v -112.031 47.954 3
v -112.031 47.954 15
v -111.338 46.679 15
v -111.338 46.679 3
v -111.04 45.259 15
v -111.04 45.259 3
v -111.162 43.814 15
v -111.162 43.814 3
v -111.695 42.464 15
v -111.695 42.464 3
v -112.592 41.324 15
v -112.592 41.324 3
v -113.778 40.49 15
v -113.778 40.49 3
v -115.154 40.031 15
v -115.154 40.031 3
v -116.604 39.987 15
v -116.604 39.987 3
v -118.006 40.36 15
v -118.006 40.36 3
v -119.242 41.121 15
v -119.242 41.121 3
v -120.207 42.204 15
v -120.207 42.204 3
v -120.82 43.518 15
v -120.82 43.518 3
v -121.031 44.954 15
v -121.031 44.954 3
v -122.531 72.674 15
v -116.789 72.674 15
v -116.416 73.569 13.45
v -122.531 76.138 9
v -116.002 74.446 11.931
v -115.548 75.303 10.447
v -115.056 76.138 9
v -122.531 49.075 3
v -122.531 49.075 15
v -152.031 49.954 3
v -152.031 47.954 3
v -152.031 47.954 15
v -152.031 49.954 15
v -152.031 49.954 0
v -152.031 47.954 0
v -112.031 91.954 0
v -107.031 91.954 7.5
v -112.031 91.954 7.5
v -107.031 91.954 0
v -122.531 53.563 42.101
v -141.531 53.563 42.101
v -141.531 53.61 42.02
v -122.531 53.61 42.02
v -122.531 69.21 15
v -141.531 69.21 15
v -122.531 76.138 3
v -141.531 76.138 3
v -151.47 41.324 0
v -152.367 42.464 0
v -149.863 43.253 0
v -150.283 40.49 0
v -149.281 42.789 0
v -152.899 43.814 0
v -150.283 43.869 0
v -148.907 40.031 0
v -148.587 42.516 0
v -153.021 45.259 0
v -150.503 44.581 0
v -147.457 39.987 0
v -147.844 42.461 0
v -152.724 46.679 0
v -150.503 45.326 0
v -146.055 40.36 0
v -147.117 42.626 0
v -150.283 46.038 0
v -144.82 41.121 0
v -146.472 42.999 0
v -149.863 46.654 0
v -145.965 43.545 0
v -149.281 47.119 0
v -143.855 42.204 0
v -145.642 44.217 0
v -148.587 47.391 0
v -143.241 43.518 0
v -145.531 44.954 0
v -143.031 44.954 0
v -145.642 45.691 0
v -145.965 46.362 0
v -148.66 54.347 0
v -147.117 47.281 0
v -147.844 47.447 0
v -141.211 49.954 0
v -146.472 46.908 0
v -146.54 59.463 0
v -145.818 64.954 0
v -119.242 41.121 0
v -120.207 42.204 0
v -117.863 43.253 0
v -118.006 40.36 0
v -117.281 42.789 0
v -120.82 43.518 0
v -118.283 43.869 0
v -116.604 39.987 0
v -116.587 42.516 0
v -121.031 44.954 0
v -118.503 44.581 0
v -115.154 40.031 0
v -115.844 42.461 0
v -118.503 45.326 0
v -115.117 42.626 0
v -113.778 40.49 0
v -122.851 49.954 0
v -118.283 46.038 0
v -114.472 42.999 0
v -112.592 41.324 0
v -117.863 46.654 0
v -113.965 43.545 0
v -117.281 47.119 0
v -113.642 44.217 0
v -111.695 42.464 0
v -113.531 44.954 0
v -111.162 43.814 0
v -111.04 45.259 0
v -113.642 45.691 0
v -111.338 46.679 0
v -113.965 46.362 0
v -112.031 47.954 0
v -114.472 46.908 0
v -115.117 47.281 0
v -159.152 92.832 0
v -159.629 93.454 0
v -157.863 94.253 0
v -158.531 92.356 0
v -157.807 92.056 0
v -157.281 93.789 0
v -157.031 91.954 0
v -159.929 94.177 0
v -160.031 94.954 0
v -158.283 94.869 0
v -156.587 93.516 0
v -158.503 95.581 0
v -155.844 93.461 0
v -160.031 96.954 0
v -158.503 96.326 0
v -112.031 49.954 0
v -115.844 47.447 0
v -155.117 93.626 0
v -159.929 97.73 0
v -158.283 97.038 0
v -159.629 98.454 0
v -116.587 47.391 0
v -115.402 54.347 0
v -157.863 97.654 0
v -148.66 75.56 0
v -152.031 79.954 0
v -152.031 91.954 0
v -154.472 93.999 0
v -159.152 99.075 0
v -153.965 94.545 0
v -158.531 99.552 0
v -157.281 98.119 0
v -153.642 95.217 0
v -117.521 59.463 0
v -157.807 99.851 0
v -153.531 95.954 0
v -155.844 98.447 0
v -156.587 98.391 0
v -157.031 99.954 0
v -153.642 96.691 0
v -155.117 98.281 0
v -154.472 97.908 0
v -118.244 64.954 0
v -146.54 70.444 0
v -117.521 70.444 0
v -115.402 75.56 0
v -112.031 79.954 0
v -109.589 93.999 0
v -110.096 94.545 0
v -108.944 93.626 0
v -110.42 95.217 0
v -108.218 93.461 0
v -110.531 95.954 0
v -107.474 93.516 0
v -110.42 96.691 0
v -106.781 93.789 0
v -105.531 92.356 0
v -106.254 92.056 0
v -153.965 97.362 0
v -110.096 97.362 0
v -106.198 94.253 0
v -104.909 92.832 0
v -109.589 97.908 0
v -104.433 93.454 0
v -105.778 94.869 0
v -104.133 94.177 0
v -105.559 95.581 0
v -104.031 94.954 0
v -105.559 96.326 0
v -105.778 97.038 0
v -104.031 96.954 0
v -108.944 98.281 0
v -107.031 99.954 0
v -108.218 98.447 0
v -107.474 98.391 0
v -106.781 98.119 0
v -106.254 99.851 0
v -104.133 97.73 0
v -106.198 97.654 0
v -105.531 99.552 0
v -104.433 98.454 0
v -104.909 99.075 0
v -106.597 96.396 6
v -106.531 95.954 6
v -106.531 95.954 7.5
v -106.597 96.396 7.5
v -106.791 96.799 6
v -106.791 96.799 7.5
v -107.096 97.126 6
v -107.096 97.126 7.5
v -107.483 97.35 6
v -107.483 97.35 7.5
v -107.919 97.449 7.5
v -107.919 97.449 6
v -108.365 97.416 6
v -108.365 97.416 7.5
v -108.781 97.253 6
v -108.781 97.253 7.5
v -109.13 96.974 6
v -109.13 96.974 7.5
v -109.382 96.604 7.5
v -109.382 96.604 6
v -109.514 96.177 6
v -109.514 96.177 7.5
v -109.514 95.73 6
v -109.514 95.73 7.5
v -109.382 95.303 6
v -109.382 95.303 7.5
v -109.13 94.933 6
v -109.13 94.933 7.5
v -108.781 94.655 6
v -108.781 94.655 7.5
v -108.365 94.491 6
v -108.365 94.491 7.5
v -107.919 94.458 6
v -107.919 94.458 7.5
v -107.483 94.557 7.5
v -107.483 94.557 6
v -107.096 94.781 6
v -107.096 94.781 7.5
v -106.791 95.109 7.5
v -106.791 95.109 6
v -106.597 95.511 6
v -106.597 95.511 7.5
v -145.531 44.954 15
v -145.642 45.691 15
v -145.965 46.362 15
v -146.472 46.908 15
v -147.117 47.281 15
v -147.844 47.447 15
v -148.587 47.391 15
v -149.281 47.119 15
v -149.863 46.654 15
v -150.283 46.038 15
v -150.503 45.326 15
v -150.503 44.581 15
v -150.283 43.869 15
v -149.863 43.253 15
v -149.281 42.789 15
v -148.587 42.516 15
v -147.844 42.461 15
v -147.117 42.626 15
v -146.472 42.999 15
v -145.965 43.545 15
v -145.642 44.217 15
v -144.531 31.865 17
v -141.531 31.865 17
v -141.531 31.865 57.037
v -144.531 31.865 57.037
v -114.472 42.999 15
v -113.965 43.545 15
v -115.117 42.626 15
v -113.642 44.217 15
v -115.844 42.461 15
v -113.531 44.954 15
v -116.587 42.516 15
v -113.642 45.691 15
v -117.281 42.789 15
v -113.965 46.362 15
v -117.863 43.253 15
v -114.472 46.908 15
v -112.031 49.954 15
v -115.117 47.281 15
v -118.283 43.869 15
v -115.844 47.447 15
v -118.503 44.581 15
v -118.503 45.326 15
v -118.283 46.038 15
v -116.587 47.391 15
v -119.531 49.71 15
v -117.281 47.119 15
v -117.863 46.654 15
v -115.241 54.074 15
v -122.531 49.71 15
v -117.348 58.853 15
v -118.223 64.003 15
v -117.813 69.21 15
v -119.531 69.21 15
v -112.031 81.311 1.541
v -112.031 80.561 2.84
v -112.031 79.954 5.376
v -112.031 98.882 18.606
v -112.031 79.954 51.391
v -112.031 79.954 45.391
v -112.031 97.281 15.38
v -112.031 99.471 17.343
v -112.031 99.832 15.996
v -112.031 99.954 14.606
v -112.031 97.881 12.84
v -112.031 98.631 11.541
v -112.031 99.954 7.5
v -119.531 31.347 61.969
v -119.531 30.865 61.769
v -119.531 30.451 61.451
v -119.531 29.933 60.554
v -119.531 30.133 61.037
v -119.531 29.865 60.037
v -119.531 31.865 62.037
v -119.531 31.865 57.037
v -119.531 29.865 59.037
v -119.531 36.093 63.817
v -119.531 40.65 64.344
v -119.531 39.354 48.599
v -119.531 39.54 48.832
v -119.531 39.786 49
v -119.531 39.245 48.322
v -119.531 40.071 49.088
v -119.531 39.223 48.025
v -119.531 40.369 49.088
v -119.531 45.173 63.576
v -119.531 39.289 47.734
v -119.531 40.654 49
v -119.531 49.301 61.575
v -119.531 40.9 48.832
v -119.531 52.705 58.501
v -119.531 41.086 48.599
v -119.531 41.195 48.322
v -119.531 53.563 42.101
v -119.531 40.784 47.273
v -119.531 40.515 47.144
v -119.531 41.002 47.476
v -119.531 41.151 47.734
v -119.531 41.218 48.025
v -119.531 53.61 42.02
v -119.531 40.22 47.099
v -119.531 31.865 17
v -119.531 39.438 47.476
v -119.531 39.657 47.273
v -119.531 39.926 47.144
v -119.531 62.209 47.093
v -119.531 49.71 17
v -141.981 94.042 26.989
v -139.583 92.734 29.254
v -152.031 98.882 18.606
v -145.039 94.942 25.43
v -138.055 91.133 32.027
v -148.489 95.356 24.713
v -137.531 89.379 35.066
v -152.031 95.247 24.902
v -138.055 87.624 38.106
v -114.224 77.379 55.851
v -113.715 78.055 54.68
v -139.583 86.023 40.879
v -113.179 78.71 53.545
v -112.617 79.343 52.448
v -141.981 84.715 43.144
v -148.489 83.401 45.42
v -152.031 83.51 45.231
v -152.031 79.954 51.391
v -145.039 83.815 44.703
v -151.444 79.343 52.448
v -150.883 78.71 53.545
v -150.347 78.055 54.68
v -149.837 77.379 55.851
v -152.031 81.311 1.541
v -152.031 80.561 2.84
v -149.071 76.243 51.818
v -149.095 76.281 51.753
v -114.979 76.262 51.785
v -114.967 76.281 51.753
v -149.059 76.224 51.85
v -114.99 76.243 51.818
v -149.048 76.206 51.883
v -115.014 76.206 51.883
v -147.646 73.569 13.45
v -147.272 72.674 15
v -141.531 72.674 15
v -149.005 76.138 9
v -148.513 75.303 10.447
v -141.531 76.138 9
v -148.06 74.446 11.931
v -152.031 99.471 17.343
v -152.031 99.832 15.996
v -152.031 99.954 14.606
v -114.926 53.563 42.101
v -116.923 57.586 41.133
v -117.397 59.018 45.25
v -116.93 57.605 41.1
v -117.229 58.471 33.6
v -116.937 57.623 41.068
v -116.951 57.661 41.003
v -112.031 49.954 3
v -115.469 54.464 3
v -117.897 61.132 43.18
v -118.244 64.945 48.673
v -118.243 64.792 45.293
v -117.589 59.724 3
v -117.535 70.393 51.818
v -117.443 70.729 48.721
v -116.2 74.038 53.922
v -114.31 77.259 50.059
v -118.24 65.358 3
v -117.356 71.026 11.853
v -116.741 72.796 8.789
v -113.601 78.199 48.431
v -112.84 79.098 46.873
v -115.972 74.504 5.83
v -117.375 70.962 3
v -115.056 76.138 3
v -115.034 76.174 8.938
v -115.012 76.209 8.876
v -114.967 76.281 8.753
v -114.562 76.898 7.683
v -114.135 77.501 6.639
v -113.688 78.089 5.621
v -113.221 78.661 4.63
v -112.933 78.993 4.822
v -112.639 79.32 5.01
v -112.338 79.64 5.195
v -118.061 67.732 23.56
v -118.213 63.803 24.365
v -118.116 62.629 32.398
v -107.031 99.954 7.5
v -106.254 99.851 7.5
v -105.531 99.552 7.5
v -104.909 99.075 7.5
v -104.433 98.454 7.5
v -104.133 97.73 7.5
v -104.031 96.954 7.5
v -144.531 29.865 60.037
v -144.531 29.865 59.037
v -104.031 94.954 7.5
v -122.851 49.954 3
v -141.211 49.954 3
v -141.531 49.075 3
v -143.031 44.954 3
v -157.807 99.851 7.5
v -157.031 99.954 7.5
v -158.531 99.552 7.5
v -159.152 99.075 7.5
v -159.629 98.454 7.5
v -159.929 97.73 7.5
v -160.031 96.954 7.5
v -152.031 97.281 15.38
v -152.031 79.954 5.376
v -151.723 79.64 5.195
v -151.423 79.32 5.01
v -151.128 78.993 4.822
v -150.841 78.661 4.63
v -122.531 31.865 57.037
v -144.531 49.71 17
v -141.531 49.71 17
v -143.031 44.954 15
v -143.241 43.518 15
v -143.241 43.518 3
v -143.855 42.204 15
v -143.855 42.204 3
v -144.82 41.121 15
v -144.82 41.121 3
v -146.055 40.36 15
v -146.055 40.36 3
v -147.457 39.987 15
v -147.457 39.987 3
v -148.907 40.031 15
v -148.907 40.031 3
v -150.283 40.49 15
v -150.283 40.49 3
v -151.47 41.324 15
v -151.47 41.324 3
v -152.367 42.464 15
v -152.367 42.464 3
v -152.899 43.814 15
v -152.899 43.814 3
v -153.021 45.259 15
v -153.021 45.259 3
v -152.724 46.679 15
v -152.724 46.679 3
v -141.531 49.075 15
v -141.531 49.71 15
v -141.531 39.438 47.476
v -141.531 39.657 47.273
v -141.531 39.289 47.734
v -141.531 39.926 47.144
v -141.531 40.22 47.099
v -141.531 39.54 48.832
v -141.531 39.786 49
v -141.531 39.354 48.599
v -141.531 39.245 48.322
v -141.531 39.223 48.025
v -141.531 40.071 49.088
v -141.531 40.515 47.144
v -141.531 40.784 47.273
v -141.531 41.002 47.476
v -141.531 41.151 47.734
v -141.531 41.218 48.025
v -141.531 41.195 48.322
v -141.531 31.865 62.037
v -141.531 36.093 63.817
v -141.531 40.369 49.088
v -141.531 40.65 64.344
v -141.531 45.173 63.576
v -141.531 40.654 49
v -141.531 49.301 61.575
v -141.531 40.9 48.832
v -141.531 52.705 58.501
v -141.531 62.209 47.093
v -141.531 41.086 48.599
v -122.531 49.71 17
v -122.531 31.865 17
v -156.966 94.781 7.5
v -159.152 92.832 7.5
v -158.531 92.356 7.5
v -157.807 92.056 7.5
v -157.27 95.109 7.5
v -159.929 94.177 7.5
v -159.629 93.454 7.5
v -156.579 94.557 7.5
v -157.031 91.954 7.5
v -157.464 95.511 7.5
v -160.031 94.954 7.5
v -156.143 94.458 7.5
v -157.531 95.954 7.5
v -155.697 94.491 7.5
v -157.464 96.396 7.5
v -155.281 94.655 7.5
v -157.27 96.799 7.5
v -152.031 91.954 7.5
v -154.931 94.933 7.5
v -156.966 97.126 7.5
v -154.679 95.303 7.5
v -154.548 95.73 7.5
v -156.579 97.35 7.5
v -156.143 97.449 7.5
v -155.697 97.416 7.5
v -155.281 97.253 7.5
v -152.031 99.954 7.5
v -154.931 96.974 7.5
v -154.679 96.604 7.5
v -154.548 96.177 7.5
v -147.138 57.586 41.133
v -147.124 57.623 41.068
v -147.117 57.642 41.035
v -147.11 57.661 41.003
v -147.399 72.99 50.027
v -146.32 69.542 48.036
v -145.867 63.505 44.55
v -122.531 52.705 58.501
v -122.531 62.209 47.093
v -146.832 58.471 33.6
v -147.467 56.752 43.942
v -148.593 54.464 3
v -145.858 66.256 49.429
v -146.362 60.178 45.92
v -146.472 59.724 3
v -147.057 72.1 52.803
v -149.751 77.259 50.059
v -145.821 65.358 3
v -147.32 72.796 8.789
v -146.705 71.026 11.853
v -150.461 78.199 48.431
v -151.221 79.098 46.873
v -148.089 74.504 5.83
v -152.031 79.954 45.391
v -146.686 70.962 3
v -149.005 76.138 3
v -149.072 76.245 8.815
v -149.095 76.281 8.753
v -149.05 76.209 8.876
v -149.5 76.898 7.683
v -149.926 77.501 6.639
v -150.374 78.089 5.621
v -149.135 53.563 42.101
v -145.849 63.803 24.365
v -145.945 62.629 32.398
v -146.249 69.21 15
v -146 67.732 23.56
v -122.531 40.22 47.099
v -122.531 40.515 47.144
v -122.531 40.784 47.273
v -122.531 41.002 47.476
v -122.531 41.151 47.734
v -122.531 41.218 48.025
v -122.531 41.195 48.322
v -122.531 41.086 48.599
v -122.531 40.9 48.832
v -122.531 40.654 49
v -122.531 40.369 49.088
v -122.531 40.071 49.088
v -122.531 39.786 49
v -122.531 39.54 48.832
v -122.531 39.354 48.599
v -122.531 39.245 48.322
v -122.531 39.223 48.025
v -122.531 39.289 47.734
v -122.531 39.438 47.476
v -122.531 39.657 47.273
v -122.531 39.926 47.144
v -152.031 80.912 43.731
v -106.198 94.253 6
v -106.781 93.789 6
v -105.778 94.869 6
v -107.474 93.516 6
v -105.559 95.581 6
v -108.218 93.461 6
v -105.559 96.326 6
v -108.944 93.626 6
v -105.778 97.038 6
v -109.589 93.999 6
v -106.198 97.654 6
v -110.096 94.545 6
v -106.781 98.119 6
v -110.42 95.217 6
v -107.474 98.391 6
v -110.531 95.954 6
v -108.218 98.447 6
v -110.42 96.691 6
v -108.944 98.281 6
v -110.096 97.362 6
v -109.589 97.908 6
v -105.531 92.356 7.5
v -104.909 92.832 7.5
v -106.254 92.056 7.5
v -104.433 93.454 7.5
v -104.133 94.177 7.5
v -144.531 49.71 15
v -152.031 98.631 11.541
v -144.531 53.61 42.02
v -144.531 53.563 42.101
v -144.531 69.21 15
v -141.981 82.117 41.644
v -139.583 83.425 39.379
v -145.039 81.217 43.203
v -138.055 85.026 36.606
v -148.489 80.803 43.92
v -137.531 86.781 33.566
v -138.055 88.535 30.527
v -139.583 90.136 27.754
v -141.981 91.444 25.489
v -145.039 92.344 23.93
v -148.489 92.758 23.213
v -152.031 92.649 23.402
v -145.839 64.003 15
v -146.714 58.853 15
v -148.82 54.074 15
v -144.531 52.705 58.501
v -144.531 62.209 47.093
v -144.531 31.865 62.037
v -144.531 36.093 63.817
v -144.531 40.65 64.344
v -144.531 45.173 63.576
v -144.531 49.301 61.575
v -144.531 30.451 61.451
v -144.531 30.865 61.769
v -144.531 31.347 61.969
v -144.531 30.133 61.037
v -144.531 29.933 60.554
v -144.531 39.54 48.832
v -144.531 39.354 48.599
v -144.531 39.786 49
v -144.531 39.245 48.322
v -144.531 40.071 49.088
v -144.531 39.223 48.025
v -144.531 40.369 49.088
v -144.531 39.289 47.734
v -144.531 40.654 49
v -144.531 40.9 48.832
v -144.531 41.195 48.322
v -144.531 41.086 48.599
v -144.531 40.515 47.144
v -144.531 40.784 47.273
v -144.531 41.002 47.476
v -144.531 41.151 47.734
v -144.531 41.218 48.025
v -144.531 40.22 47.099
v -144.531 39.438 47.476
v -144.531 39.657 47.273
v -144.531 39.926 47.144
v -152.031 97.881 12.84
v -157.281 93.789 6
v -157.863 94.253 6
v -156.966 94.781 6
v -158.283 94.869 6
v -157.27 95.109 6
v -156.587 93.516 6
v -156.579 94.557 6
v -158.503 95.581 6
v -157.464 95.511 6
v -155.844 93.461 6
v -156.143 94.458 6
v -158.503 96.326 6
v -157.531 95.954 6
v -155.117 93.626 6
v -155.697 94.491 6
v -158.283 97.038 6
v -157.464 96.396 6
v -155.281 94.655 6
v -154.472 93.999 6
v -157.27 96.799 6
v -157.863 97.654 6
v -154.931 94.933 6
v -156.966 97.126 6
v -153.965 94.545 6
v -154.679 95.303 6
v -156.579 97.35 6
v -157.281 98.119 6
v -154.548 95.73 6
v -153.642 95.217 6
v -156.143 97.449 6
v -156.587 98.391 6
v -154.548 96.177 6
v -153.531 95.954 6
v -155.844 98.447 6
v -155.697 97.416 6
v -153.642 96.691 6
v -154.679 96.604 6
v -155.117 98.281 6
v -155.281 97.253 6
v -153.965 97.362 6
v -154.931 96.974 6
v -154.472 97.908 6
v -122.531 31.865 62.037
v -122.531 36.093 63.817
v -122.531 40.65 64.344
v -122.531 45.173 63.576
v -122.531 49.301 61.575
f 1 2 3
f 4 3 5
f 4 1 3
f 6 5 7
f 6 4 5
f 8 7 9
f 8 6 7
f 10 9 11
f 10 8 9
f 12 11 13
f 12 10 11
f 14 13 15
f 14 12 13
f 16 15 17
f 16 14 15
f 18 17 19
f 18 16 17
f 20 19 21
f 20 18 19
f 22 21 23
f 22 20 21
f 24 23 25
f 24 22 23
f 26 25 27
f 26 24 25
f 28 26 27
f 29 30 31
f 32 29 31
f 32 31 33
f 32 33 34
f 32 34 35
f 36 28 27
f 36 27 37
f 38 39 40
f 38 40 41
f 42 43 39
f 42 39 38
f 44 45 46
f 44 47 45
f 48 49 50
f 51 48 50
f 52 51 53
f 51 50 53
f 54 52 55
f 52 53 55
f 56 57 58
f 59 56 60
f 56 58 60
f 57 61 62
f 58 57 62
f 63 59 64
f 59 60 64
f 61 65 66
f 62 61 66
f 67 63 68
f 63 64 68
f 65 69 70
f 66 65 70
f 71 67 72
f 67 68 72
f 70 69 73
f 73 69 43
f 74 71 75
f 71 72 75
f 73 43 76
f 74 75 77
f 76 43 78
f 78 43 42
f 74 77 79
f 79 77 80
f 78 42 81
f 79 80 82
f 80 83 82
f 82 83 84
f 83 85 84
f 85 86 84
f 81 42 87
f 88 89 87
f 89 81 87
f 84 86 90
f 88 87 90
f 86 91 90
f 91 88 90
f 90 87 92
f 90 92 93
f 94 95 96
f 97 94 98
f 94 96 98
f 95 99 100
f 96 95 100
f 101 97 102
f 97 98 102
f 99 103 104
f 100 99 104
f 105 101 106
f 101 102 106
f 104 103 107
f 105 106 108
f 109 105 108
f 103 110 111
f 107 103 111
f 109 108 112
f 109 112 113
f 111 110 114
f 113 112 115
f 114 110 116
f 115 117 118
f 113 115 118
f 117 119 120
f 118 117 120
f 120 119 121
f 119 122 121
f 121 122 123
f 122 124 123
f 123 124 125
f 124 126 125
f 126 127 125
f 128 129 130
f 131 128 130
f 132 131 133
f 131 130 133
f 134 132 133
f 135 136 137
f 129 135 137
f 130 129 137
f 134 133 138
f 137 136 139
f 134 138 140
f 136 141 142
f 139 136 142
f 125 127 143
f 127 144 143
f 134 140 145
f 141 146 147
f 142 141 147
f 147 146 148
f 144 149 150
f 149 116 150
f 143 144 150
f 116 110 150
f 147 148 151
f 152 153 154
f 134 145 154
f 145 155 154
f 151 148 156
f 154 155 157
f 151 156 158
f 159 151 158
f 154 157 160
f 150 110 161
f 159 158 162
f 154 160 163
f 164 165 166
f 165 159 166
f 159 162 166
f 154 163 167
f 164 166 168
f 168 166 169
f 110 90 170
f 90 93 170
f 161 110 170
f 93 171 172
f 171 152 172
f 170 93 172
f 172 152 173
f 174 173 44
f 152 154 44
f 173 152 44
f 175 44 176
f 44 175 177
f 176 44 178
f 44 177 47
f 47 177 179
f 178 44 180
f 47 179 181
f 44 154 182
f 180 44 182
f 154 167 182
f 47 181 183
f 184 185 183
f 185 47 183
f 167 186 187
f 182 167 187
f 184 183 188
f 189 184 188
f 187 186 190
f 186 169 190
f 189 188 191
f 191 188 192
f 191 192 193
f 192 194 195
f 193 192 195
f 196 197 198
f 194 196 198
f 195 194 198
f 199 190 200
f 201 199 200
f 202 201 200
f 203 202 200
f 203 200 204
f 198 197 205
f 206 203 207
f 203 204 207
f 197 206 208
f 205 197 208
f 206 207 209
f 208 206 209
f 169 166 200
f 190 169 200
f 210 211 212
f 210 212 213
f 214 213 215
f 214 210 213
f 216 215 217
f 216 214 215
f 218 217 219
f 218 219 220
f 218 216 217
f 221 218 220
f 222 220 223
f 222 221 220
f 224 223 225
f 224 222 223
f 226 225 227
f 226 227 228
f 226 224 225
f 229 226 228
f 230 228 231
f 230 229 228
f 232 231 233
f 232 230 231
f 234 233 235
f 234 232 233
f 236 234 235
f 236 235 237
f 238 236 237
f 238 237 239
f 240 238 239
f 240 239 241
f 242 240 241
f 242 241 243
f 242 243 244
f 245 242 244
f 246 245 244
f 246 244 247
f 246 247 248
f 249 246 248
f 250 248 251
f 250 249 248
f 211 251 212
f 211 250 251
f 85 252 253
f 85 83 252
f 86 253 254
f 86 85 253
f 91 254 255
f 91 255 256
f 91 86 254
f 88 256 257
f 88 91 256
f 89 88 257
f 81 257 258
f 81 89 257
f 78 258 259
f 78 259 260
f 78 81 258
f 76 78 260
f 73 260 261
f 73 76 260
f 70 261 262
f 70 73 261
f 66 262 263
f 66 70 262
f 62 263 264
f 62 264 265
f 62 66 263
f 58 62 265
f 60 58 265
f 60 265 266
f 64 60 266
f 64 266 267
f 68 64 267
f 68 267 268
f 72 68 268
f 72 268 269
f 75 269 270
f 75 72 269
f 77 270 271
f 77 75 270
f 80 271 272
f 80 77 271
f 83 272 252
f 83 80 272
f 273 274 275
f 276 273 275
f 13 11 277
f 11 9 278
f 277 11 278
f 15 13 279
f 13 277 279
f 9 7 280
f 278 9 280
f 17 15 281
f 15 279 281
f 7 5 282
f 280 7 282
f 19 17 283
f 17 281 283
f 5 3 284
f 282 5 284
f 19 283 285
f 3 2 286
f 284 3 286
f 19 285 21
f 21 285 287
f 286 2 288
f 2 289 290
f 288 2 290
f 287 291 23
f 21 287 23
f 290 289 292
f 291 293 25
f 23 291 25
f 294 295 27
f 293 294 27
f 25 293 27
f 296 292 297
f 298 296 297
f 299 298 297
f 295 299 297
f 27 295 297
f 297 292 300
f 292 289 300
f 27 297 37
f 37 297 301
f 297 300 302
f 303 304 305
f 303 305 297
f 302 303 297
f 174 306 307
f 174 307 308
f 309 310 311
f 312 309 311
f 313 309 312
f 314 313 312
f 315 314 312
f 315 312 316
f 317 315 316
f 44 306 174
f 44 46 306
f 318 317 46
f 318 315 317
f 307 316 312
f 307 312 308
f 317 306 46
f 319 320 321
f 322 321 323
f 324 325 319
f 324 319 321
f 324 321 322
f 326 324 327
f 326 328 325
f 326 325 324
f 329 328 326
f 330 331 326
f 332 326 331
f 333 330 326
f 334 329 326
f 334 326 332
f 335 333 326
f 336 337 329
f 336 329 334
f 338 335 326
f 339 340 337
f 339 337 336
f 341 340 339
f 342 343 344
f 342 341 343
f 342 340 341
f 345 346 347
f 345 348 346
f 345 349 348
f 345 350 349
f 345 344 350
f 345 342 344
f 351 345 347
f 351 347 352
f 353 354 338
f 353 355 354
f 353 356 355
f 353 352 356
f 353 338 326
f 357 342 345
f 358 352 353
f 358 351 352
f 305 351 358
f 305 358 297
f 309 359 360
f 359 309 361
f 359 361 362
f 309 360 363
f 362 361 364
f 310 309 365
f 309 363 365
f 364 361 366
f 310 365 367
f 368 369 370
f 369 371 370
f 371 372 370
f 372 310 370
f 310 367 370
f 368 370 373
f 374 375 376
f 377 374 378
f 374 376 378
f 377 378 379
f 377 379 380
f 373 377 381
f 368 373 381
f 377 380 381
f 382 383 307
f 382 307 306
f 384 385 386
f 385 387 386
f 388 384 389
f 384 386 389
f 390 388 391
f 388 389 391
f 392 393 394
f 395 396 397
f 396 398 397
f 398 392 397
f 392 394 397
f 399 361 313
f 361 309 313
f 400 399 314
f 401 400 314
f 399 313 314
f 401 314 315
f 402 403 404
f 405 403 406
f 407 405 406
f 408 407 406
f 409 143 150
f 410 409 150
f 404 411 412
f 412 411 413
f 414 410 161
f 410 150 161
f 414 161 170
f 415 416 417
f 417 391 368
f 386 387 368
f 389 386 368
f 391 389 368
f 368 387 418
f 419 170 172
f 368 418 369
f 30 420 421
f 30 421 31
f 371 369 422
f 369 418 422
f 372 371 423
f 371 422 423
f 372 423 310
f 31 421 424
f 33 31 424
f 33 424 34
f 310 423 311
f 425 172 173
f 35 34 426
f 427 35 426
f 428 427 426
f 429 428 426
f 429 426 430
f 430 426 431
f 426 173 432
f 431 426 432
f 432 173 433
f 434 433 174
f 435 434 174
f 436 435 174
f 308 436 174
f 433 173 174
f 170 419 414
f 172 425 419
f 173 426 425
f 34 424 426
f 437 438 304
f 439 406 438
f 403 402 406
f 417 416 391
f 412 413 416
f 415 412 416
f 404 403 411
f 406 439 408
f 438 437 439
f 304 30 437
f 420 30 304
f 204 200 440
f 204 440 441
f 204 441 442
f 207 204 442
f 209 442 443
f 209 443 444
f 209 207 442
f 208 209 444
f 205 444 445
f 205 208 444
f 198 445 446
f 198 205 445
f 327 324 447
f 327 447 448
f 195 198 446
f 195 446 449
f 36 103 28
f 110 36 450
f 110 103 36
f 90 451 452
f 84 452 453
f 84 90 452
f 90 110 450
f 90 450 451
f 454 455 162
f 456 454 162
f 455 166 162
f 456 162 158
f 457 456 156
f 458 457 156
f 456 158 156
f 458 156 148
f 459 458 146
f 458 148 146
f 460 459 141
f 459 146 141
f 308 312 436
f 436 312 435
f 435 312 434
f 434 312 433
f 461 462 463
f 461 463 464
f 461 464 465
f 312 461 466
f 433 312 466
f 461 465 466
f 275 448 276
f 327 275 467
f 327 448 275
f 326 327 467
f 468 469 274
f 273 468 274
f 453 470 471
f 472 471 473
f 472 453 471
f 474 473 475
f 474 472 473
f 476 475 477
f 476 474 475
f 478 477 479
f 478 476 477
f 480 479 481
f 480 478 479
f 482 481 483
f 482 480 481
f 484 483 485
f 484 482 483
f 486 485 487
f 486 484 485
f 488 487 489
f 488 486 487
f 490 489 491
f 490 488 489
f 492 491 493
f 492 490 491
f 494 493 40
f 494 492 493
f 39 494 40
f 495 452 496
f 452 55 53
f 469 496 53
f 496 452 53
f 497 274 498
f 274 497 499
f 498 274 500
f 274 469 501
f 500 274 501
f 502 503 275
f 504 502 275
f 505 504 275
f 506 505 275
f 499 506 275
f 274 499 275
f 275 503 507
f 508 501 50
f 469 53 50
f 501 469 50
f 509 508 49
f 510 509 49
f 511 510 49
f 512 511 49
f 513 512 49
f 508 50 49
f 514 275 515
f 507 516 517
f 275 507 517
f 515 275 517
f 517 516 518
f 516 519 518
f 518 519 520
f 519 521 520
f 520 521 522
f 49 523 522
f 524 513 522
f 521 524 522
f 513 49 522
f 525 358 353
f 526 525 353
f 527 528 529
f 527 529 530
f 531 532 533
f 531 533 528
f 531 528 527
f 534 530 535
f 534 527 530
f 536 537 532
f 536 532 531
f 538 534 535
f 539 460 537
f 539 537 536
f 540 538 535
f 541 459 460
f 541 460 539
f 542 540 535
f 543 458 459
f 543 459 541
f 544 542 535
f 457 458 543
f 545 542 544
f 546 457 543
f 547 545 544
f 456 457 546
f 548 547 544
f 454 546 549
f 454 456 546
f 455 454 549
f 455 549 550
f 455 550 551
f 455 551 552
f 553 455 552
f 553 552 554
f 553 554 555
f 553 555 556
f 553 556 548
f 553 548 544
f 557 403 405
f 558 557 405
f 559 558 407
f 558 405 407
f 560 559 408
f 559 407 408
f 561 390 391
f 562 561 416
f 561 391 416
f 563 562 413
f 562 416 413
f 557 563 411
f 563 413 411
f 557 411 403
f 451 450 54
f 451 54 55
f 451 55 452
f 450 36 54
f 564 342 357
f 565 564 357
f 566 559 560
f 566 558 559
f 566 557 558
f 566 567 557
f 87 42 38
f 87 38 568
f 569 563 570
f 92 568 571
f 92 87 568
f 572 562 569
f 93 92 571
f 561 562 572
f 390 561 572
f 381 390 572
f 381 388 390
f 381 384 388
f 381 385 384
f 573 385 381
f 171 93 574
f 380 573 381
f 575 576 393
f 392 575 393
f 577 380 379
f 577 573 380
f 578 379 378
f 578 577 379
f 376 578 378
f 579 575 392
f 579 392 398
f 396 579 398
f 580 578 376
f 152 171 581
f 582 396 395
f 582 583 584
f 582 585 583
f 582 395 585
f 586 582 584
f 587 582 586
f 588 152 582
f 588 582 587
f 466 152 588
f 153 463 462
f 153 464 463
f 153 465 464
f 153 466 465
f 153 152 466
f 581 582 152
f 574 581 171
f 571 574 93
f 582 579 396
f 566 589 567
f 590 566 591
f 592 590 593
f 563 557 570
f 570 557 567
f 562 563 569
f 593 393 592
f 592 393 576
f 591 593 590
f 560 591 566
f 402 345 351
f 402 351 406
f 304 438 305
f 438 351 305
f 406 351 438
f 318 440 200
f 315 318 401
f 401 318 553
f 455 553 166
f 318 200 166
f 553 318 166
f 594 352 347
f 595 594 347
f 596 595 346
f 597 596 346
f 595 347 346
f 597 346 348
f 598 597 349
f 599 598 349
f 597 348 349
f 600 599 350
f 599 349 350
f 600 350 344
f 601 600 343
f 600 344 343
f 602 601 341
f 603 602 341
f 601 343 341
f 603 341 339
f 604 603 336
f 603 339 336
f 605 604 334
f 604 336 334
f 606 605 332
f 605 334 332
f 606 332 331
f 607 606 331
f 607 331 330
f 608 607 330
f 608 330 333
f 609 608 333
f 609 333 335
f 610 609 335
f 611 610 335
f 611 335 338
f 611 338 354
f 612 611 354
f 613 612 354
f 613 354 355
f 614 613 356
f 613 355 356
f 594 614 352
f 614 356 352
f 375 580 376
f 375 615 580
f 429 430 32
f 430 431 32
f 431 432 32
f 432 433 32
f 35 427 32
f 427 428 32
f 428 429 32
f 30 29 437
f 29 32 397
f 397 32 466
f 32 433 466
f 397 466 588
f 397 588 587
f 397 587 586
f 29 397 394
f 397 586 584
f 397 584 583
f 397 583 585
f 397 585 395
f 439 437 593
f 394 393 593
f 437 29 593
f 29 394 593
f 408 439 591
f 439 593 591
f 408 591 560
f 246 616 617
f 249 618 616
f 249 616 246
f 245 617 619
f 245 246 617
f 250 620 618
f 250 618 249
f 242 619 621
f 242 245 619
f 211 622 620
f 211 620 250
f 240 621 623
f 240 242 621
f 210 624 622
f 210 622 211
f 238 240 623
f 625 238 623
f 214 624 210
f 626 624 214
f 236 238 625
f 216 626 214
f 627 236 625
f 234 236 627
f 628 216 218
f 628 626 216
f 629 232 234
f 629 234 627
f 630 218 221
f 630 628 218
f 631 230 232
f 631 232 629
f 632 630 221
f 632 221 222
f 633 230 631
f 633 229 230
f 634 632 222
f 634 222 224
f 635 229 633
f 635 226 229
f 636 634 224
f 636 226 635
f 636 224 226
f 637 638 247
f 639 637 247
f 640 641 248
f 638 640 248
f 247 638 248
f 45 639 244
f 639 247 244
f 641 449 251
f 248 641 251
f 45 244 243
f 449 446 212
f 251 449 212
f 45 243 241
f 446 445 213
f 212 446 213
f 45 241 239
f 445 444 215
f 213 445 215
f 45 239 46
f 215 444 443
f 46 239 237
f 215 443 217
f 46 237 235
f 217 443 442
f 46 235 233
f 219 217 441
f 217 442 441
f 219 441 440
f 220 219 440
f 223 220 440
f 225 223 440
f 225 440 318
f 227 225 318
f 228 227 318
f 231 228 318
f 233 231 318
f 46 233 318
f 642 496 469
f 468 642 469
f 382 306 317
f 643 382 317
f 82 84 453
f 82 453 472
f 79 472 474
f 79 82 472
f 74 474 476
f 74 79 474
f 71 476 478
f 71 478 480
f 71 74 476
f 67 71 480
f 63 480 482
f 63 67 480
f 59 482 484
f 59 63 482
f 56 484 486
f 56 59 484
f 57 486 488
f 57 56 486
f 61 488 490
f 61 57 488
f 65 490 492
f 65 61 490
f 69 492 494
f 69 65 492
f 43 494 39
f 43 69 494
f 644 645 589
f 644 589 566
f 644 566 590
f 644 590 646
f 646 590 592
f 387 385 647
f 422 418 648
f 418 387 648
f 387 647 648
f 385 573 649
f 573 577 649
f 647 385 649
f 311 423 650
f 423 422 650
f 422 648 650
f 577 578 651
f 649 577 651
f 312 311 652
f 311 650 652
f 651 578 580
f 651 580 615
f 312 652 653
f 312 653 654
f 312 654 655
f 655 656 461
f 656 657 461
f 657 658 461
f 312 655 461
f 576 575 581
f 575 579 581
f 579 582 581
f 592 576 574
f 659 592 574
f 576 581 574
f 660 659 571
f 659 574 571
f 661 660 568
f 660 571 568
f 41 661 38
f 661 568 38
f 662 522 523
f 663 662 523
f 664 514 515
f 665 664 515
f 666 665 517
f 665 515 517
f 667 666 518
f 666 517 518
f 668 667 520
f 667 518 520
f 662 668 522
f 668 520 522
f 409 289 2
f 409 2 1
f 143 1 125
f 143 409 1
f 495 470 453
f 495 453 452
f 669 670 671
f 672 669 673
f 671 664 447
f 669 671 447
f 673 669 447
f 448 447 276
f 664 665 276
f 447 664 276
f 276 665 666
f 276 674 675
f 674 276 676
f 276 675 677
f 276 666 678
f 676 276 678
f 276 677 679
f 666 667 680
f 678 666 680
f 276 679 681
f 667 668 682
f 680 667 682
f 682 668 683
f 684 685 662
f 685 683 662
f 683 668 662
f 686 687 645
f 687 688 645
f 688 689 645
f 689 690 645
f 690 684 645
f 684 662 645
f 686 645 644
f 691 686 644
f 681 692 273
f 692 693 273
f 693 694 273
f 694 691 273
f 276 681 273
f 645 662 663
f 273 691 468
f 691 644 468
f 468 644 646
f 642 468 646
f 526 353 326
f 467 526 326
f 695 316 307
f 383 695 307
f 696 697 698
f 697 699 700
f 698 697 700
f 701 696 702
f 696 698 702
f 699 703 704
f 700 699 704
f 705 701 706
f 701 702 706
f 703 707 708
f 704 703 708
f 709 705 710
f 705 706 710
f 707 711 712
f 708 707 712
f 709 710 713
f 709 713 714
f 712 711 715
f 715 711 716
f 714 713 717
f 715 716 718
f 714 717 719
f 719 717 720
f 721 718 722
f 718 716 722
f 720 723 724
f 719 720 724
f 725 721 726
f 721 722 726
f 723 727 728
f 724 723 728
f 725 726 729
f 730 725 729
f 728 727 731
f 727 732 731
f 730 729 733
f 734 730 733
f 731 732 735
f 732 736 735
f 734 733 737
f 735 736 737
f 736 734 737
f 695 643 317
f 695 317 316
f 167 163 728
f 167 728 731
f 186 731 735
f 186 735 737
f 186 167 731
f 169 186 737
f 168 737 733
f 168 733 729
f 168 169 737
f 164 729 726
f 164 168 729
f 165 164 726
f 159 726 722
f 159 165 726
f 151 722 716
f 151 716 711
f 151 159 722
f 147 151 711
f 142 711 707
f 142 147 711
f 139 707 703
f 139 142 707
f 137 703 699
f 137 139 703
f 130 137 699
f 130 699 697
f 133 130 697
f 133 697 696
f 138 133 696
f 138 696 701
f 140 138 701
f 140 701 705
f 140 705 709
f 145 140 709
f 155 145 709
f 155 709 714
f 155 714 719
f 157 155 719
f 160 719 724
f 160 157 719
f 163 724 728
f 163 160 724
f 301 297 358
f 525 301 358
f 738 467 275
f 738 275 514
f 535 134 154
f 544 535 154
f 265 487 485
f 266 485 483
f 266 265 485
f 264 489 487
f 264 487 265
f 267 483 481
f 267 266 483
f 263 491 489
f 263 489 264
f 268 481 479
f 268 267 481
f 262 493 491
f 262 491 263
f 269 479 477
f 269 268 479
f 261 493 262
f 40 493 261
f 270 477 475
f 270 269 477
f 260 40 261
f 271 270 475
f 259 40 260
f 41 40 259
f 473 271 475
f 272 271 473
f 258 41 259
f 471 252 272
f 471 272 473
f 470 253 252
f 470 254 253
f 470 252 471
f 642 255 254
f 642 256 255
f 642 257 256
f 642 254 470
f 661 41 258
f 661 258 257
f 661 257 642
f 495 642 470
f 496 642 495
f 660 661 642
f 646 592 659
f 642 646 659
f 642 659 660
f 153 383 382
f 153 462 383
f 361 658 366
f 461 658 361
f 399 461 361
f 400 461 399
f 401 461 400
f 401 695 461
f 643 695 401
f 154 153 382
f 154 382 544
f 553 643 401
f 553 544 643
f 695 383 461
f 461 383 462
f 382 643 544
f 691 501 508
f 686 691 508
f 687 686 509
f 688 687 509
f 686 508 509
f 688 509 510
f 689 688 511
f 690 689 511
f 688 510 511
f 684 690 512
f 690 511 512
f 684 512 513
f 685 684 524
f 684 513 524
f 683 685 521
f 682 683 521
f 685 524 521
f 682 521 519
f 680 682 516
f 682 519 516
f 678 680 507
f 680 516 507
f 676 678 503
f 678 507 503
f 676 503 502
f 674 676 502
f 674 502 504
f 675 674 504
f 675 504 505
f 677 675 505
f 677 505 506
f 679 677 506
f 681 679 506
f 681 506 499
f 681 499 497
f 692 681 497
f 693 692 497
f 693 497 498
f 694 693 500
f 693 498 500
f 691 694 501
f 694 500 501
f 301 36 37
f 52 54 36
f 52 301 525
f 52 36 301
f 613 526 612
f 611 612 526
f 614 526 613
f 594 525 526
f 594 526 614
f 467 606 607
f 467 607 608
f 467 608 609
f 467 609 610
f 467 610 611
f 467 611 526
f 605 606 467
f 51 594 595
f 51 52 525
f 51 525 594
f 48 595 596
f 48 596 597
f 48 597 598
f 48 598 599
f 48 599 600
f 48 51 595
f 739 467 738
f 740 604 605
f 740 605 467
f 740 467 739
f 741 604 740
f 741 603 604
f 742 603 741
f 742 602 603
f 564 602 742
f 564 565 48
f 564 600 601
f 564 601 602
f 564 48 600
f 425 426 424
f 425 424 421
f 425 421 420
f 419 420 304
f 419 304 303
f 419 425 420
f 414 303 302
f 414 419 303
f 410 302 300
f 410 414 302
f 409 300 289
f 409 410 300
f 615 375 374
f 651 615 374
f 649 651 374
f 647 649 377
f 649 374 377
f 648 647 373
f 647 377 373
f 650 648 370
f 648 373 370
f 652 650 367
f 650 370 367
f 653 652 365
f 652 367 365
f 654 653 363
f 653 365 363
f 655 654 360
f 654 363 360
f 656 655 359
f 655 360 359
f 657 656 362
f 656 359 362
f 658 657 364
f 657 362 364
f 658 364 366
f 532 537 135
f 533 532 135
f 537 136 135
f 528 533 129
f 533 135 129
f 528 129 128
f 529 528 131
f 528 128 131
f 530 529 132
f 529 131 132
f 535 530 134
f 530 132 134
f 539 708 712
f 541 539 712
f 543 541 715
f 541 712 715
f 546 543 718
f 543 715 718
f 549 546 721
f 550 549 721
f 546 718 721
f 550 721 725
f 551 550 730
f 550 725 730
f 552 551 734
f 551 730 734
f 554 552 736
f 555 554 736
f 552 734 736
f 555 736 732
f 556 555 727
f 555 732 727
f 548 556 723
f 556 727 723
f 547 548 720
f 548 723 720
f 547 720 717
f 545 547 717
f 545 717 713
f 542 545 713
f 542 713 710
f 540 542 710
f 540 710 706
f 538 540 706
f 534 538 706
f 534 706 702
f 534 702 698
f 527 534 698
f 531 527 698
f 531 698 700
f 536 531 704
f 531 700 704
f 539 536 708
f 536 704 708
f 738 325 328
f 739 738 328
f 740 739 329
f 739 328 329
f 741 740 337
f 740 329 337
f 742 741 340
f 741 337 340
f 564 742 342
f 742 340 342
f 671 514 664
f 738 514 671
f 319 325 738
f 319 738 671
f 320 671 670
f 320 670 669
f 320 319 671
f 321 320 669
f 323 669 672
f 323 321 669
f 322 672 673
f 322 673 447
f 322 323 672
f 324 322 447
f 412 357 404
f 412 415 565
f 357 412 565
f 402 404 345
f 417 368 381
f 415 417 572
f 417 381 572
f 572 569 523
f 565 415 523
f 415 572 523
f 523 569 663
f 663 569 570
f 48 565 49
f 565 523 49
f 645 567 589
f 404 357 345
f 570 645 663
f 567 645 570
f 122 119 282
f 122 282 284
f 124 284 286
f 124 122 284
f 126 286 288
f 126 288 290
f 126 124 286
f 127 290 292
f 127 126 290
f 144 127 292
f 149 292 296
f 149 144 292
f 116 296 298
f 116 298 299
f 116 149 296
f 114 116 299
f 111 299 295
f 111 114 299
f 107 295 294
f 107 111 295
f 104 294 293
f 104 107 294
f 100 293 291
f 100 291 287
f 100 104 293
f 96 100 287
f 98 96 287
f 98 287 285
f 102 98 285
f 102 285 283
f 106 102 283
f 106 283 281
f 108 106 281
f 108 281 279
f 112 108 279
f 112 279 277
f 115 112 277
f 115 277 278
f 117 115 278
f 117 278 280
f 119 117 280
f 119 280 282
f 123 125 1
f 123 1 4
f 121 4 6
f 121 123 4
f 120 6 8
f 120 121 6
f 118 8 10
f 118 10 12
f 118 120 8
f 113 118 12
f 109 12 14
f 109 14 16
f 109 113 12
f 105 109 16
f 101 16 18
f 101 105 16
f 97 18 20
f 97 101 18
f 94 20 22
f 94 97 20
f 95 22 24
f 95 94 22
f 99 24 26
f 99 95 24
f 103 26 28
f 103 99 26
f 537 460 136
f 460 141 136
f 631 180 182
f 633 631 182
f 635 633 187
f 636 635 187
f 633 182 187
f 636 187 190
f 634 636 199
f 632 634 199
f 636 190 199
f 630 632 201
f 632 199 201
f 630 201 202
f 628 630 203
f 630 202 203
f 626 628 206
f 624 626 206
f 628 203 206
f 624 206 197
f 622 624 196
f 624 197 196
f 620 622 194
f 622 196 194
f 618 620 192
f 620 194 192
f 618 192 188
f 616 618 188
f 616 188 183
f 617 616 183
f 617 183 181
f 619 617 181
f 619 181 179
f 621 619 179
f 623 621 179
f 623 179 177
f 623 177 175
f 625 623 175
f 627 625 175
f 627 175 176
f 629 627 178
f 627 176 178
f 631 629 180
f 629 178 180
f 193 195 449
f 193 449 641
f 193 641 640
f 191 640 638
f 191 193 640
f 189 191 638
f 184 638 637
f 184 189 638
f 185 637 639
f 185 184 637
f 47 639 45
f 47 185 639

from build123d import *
from build123d.topology import SkipClean

# Parameters (mm, degrees)
CROQUIS2_R               = 2.5
SALIENTE_EXTRUIR1_DEPTH  = 3
SALIENTE_EXTRUIR2_DEPTH  = 40
CROQUIS4_R               = 2.5
SALIENTE_EXTRUIR3_DEPTH  = 12
CROQUIS7_R               = 12
CORTAR_EXTRUIR1_DEPTH    = 3
CORTAR_EXTRUIR2_DEPTH    = 55.85105
CORTAR_EXTRUIR3_DEPTH    = 40
SALIENTE_EXTRUIR7_DEPTH  = 12
CORTAR_EXTRUIR4_START    = -37.06398
CORTAR_EXTRUIR4_DEPTH    = 34.12796
CROQUIS15_R              = 1
SALIENTE_EXTRUIR8_DEPTH  = 3
SALIENTE_EXTRUIR9_START  = 22
CROQUIS15_2_R            = 1
SALIENTE_EXTRUIR9_DEPTH  = 3
REDONDEO2_R              = 8
CROQUIS32_R              = 2.5
SALIENTE_EXTRUIR14_DEPTH = 6
CROQUIS33_R              = 1.5
SALIENTE_EXTRUIR15_DEPTH = 1.5
SALIENTE_EXTRUIR16_START = -25
SALIENTE_EXTRUIR16_DEPTH = 25


with BuildPart() as part:
    # Croquis2 → Saliente-Extruir1 (new body)
    with BuildSketch(Plane.XY):
        with BuildLine():
            Line((-152.030771759, 47.953613054), (-152.030771759, 99.953613054))
            Line((-152.030771759, 99.953613054), (-112.030771759, 99.953613054))
            Line((-112.030771759, 99.953613054), (-112.030771759, 47.953613054))
            ThreePointArc((-112.030771759, 47.953613054), (-114.449632929, 40.210196563), (-121.030771759, 44.953613054))
            Line((-121.030771759, 44.953613054), (-122.85062293, 49.953613054))
            Line((-122.85062293, 49.953613054), (-141.210920588, 49.953613054))
            Line((-141.210920588, 49.953613054), (-143.030771759, 44.953613054))
            ThreePointArc((-143.030771759, 44.953613054), (-149.611910589, 40.210196563), (-152.030771759, 47.953613054))
        make_face()
        with Locations((-148.030771759, 44.953613054)):
            Circle(CROQUIS2_R, mode=Mode.SUBTRACT)
        with Locations((-116.030771759, 44.953613054)):
            Circle(CROQUIS2_R, mode=Mode.SUBTRACT)
    extrude(amount=SALIENTE_EXTRUIR1_DEPTH)

    # Croquis3 → Saliente-Extruir2 (add)
    with BuildSketch(Plane.ZY.offset(152.030771759)):
        Polygon((3, 99.953613054), (16.75, 99.953613054), (55.851046981, 77.378613054), (42.101046981, 53.56291445), (3, 76.13791445), align=None)
        Polygon((15.379903811, 97.280536842), (4.629903811, 78.660990661), (41.00297077, 57.660990661), (51.75297077, 76.280536842), align=None, mode=Mode.SUBTRACT)
    extrude(amount=-SALIENTE_EXTRUIR2_DEPTH)

    # Croquis4 → Saliente-Extruir3 (add)
    # profile 1 of 2: a face of its own
    with BuildSketch(Plane.XY.offset(3)):
        with BuildLine():
            Line((-152.030771759, 47.953613054), (-152.030771759, 49.953613054))
            Line((-152.030771759, 49.953613054), (-148.030771759, 49.953613054))
            ThreePointArc((-148.030771759, 49.953613054), (-145.794703781, 40.481477099), (-152.030771759, 47.953613054))
        make_face()
        with Locations((-148.030771759, 44.953613054)):
            Circle(CROQUIS4_R, mode=Mode.SUBTRACT)
    # profile 2 of 2: a face of its own
    with BuildSketch(Plane.XY.offset(3)):
        with BuildLine():
            Line((-112.030771759, 49.953613054), (-112.030771759, 47.953613054))
            ThreePointArc((-112.030771759, 47.953613054), (-118.266839736, 40.481477099), (-116.030771759, 49.953613054))
            Line((-116.030771759, 49.953613054), (-112.030771759, 49.953613054))
        make_face()
        with Locations((-116.030771759, 44.953613054)):
            Circle(CROQUIS4_R, mode=Mode.SUBTRACT)
    extrude(amount=SALIENTE_EXTRUIR3_DEPTH)

    # Croquis7 → Cortar-Extruir1 (cut)
    with BuildSketch(Plane(origin=(0, 82.218172547, 47.468684052), x_dir=(1, 0, 0), z_dir=(0, 0.8660254037844387, 0.4999999999999998))):
        with Locations((-149.530771759, 14.320881013)):
            Circle(CROQUIS7_R)
    extrude(amount=-CORTAR_EXTRUIR1_DEPTH, mode=Mode.SUBTRACT)

    # Croquis10 → Cortar-Extruir2 (cut)
    with BuildSketch(Plane(origin=(0, 0, 0), x_dir=(-1, 0, 0), z_dir=(0, 0, -1))):
        with BuildLine():
            Line((152.030771759, 79.953613054), (152.030771759, 49.953613054))
            ThreePointArc((152.030771759, 49.953613054), (145.817568323, 64.953613054), (152.030771759, 79.953613054))
        make_face()
        with BuildLine():
            Line((112.030771759, 79.953613054), (112.030771759, 49.953613054))
            ThreePointArc((112.030771759, 49.953613054), (118.243975195, 64.953613054), (112.030771759, 79.953613054))
        make_face()
    extrude(amount=-CORTAR_EXTRUIR2_DEPTH, mode=Mode.SUBTRACT)

    # Croquis11 → Cortar-Extruir3 (cut)
    with BuildSketch(Plane.ZY.offset(152.030771759)):
        Polygon((12.839840301, 97.881017789), (2.839840301, 80.560509714), (1.540802195, 81.310509714), (11.540802195, 98.631017789), align=None)
    extrude(amount=-CORTAR_EXTRUIR3_DEPTH, mode=Mode.SUBTRACT)

    # Croquis12 → Saliente-Extruir7 (add)
    with SkipClean():  # the faces are left unmerged after this step: merging them gives an invalid solid
        with BuildSketch(Plane.XY.offset(3)):
            with BuildLine():
                Line((-152.030771759, 49.953613054), (-148.030771759, 49.953613054))
                ThreePointArc((-148.030771759, 49.953613054), (-144.495237853, 48.48914696), (-143.030771759, 44.953613054))
                Line((-143.030771759, 44.953613054), (-141.530771759, 49.074829183))
                Line((-141.530771759, 49.074829183), (-141.530771759, 76.13791445))
                Line((-141.530771759, 76.13791445), (-149.005472808, 76.13791445))
                ThreePointArc((-149.005472808, 76.13791445), (-145.957755776, 62.518865142), (-152.030771759, 49.953613054))
            make_face()
            with BuildLine():
                Line((-121.030771759, 44.953613054), (-122.530771759, 49.074829183))
                Line((-122.530771759, 49.074829183), (-122.530771759, 76.13791445))
                Line((-122.530771759, 76.13791445), (-115.05607071, 76.13791445))
                ThreePointArc((-115.05607071, 76.13791445), (-118.103787742, 62.518865142), (-112.030771759, 49.953613054))
                Line((-112.030771759, 49.953613054), (-116.030771759, 49.953613054))
                ThreePointArc((-116.030771759, 49.953613054), (-119.566305665, 48.48914696), (-121.030771759, 44.953613054))
            make_face()
        extrude(amount=SALIENTE_EXTRUIR7_DEPTH)

    # Croquis14 → Cortar-Extruir4 (cut)
    with BuildSketch(Plane.ZY.offset(152.030771759).offset(CORTAR_EXTRUIR4_START)):
        Polygon((15.379903811, 97.280536842), (51.88287458, 76.205536842), (41.13287458, 57.585990661), (4.629903811, 78.660990661), align=None)
    extrude(amount=CORTAR_EXTRUIR4_DEPTH, mode=Mode.SUBTRACT)

    # Croquis15 → Saliente-Extruir8 (add)
    with BuildSketch(Plane(origin=(-141.530771759, 0, 0), x_dir=(0, 0, -1), z_dir=(1, 0, 0))):
        with BuildLine():
            Line((-15, 69.209711219), (-15, 49.709711219))
            Line((-15, 49.709711219), (-17, 49.709711219))
            Line((-17, 49.709711219), (-17, 31.865013093))
            Line((-17, 31.865013093), (-50.633644315, 31.865013093))
            Line((-50.633644315, 31.865013093), (-62.036793098, 31.865013093))
            ThreePointArc((-62.036793098, 31.865013093), (-64.120396014, 42.938683324), (-58.500710752, 52.705295379))
            Line((-58.500710752, 52.705295379), (-47.019992598, 62.269965257))
            Line((-47.019992598, 62.269965257), (-42.019992598, 53.609711219))
            Line((-42.019992598, 53.609711219), (-15, 69.209711219))
        make_face()
        with Locations((-48.09937995, 40.220311696)):
            Circle(CROQUIS15_R, mode=Mode.SUBTRACT)
    extrude(amount=-SALIENTE_EXTRUIR8_DEPTH)

    # Croquis15<2> → Saliente-Extruir9 (add)
    with BuildSketch(Plane(origin=(-141.530771759, 0, 0), x_dir=(0, 0, -1), z_dir=(1, 0, 0)).offset(SALIENTE_EXTRUIR9_START)):
        with BuildLine():
            Line((-15, 69.209711219), (-15, 49.709711219))
            Line((-15, 49.709711219), (-17, 49.709711219))
            Line((-17, 49.709711219), (-17, 31.865013093))
            Line((-17, 31.865013093), (-50.633644315, 31.865013093))
            Line((-50.633644315, 31.865013093), (-62.036793098, 31.865013093))
            ThreePointArc((-62.036793098, 31.865013093), (-64.120396014, 42.938683324), (-58.500710752, 52.705295379))
            Line((-58.500710752, 52.705295379), (-47.019992598, 62.269965257))
            Line((-47.019992598, 62.269965257), (-42.019992598, 53.609711219))
            Line((-42.019992598, 53.609711219), (-15, 69.209711219))
        make_face()
        with Locations((-48.09937995, 40.220311696)):
            Circle(CROQUIS15_2_R, mode=Mode.SUBTRACT)
    extrude(amount=-SALIENTE_EXTRUIR9_DEPTH)

    # Redondeo2
    redondeo2_edges = [part.edges().sort_by_distance(p)[0] for p in [
        (-132.030771759, 99.953613054, 16.75),
    ]]
    fillet(redondeo2_edges, radius=REDONDEO2_R)

    # Croquis32 → Saliente-Extruir14 (add)
    with BuildSketch(Plane(origin=(0, 0, 0), x_dir=(-1, 0, 0), z_dir=(0, 0, -1))):
        with BuildLine():
            Line((112.030771759, 99.953613054), (107.030771759, 99.953613054))
            ThreePointArc((107.030771759, 99.953613054), (104.909451415, 99.074933397), (104.030771759, 96.953613054))
            Line((104.030771759, 96.953613054), (104.030771759, 94.953613054))
            ThreePointArc((104.030771759, 94.953613054), (104.909451415, 92.83229271), (107.030771759, 91.953613054))
            Line((107.030771759, 91.953613054), (112.030771759, 91.953613054))
            Line((112.030771759, 91.953613054), (112.030771759, 99.953613054))
        make_face()
        with Locations((108.030771759, 95.953613054)):
            Circle(CROQUIS32_R, mode=Mode.SUBTRACT)
    saliente_extruir14 = extrude(amount=-SALIENTE_EXTRUIR14_DEPTH)

    # Croquis33 → Saliente-Extruir15 (add)
    with BuildSketch(Plane.XY.offset(6)):
        with BuildLine():
            Line((-112.030771759, 99.953613054), (-107.030771759, 99.953613054))
            ThreePointArc((-107.030771759, 99.953613054), (-104.909451415, 99.074933397), (-104.030771759, 96.953613054))
            Line((-104.030771759, 96.953613054), (-104.030771759, 94.953613054))
            ThreePointArc((-104.030771759, 94.953613054), (-104.909451415, 92.83229271), (-107.030771759, 91.953613054))
            Line((-107.030771759, 91.953613054), (-112.030771759, 91.953613054))
            Line((-112.030771759, 91.953613054), (-112.030771759, 99.953613054))
        make_face()
        with Locations((-108.030771759, 95.953613054)):
            Circle(CROQUIS33_R, mode=Mode.SUBTRACT)
    saliente_extruir15 = extrude(amount=SALIENTE_EXTRUIR15_DEPTH)

    # Simetría1: Saliente-Extruir14, Saliente-Extruir15 across plane
    add(saliente_extruir14.mirror(Plane(origin=(-132.030771759, 0, 0), x_dir=(0, 0, 1), z_dir=(1, 0, 0))))
    add(saliente_extruir15.mirror(Plane(origin=(-132.030771759, 0, 0), x_dir=(0, 0, 1), z_dir=(1, 0, 0))))

    # Croquis36 → Saliente-Extruir16 (add)
    with BuildSketch(Plane.ZY.offset(144.530771759).offset(SALIENTE_EXTRUIR16_START)):
        with BuildLine():
            Line((57.036793098, 31.865013093), (62.036793098, 31.865013093))
            ThreePointArc((62.036793098, 31.865013093), (61.45100666, 30.450799531), (60.036793098, 29.865013093))
            Line((60.036793098, 29.865013093), (59.036793098, 29.865013093))
            Line((59.036793098, 29.865013093), (57.036793098, 31.865013093))
        make_face()
    extrude(amount=SALIENTE_EXTRUIR16_DEPTH)


solid = part.part
